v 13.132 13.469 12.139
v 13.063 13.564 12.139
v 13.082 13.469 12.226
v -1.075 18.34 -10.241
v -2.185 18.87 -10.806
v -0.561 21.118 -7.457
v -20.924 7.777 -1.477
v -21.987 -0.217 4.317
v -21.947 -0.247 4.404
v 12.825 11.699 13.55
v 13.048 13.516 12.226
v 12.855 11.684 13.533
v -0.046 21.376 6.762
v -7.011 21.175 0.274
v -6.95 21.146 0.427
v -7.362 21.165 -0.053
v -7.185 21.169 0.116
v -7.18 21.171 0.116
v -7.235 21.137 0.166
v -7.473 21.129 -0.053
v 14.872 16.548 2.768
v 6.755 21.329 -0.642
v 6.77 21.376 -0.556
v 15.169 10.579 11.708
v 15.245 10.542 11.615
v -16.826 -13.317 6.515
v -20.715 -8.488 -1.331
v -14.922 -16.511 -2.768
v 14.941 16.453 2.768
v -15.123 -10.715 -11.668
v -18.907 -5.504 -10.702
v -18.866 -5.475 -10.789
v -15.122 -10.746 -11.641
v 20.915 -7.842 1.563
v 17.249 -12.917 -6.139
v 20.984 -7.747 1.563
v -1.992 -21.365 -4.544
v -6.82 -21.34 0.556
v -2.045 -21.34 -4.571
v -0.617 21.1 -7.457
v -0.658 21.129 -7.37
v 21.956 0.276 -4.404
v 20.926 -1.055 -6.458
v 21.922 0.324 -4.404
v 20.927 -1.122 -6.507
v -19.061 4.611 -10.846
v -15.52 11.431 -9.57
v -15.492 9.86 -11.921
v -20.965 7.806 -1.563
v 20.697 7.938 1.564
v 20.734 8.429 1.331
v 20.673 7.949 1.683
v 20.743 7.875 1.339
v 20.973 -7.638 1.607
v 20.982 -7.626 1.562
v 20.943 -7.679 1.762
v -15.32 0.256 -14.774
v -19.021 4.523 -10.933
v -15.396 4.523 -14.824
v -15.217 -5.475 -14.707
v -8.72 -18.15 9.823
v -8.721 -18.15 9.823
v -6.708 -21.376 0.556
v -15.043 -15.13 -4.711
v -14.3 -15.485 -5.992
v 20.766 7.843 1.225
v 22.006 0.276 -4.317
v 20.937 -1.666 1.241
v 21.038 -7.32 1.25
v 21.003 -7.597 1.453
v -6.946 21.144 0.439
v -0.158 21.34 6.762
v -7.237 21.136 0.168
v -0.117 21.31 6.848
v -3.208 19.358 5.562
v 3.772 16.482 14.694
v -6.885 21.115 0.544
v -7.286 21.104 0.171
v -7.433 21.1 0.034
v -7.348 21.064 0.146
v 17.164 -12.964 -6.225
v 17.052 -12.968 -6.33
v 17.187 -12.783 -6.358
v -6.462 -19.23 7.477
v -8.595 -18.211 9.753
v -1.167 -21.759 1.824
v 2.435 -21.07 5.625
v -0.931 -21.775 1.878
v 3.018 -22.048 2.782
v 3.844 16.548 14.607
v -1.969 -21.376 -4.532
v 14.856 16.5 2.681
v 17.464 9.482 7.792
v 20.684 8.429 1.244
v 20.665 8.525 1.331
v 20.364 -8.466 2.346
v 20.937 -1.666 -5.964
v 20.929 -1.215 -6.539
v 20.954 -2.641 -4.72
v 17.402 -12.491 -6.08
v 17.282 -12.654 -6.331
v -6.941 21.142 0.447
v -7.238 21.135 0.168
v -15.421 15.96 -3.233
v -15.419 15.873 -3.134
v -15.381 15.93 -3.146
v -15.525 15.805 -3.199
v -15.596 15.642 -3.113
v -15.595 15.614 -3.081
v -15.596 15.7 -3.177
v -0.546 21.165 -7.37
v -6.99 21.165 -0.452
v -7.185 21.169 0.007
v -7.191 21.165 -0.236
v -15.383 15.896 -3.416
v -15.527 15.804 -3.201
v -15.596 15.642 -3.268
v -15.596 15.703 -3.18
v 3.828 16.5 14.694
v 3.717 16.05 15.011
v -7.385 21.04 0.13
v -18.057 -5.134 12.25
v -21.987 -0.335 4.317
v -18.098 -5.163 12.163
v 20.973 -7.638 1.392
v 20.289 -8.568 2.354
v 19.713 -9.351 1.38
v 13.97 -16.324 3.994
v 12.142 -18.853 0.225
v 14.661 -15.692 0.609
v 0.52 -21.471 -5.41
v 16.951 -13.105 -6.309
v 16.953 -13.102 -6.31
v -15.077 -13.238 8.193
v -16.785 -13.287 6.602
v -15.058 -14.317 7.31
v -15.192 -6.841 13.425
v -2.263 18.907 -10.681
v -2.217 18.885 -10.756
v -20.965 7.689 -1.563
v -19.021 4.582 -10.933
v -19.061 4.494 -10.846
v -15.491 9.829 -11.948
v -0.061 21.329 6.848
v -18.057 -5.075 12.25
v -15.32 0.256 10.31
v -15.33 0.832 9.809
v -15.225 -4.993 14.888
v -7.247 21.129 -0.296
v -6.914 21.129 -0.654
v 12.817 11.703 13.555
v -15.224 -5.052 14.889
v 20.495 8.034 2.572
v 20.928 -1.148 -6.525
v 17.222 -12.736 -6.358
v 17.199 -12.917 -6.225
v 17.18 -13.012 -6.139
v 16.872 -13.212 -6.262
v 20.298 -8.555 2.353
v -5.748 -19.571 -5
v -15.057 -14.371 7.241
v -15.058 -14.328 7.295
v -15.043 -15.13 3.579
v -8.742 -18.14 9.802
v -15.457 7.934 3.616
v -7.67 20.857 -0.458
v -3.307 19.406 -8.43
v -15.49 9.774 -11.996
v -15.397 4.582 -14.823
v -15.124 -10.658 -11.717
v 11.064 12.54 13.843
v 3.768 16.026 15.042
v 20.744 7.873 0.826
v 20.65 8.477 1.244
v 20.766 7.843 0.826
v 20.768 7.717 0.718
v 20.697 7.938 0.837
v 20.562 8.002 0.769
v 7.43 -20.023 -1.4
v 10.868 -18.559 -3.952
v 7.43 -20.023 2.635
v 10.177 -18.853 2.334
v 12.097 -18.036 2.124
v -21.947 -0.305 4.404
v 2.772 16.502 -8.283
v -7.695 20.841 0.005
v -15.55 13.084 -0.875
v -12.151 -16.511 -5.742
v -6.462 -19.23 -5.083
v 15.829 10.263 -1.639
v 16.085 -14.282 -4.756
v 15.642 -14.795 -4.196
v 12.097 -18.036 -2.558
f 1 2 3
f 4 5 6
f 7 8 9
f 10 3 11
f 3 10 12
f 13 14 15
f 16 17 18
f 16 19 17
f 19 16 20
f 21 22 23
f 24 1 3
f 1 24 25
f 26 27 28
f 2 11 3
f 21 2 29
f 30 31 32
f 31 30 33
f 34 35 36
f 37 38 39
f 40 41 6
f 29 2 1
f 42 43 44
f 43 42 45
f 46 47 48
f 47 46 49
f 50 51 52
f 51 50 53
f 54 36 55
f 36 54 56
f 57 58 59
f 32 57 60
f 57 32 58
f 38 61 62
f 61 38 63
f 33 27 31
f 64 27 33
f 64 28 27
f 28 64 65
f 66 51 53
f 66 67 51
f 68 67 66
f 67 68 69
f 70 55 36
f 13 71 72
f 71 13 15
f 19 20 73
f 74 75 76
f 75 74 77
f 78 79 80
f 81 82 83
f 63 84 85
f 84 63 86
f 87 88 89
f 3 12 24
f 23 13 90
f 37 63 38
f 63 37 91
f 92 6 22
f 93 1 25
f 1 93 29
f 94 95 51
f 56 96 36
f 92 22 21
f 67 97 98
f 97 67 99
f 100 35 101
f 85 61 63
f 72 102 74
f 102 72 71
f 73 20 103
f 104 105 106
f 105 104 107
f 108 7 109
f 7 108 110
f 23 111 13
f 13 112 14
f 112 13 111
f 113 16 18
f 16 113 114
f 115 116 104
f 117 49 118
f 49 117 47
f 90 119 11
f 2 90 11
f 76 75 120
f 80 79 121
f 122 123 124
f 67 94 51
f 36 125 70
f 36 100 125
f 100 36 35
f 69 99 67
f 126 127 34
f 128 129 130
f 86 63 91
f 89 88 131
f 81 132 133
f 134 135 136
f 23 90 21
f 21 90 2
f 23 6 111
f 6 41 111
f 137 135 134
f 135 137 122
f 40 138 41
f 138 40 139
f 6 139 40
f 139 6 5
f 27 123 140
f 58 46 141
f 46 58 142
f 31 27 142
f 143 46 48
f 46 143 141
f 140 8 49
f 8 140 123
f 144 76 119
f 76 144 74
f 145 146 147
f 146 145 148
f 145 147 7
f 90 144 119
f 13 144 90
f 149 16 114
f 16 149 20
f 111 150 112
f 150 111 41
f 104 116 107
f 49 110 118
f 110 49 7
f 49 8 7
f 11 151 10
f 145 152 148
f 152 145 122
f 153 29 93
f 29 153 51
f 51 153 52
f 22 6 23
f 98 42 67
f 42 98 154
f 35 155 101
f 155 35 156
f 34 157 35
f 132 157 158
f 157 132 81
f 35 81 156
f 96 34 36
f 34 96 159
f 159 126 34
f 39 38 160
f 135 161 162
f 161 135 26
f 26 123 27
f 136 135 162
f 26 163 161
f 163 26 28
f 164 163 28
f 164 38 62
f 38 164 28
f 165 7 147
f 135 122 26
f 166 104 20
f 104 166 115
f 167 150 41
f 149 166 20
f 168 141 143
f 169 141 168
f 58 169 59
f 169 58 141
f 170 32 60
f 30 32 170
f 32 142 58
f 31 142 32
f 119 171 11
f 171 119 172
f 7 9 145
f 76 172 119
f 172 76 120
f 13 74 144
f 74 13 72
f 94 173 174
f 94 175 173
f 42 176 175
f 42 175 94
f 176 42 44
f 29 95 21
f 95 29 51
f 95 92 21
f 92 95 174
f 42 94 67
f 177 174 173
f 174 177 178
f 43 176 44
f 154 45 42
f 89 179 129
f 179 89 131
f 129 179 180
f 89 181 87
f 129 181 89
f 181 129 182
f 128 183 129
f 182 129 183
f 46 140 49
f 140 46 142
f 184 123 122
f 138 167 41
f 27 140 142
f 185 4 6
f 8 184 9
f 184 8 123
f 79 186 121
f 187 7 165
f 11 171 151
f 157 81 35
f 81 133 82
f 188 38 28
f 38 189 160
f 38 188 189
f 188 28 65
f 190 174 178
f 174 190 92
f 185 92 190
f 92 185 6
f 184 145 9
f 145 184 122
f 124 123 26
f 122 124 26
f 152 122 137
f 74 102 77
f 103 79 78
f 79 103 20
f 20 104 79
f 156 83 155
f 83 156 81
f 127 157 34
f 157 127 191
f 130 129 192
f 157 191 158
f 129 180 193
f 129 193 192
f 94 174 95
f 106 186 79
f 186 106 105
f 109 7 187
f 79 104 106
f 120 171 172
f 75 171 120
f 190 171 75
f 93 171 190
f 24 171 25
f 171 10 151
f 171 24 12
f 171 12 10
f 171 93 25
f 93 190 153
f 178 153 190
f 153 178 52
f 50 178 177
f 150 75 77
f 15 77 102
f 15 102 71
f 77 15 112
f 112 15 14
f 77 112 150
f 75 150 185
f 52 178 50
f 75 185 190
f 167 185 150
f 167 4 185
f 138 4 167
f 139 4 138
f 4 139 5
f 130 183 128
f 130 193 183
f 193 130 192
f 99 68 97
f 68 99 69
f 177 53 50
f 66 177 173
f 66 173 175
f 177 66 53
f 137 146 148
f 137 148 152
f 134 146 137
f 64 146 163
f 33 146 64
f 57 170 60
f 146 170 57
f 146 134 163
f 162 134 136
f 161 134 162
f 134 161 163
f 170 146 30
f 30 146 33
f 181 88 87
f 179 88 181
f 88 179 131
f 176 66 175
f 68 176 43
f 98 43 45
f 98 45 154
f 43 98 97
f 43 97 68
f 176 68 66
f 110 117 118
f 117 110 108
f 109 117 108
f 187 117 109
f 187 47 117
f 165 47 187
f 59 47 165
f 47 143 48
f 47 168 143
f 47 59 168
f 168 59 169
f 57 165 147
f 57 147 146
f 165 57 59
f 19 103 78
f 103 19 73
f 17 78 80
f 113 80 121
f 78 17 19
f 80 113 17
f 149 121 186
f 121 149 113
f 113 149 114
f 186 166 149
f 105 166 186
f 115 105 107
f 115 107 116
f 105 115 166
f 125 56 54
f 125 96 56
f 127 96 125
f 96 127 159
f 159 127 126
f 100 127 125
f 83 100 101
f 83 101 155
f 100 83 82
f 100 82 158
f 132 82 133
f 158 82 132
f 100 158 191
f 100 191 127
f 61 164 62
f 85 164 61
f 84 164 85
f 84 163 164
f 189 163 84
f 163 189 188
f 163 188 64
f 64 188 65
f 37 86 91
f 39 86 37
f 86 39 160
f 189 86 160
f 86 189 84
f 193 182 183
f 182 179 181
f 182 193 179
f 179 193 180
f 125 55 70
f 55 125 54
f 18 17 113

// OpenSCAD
// Auto-generated OpenSCAD file

    inner_points = 10*[[0.7057265485457351, -0.09094884907028836, -2.1180339887490542], [0.7057265485407271, -0.09094884906961656, 2.1180339887507356], [0.16480805396553816, 0.7501261667404855, -2.118033988749827], [0.16480805396053017, 0.7501261667411573, 2.118033988749963], [-0.13534846726503874, -0.6318673436504852, -2.118033988749963], [-0.13534846727004674, -0.6318673436498135, 2.118033988749827], [-0.6762669618452357, 0.20920767216028854, -2.1180339887507356], [-0.6762669618502437, 0.20920767216096034, 2.1180339887490542], [2.0666145112140093, 0.7842756603041526, -0.49999999999768924], [2.066614511212827, 0.7842756603043113, 0.5000000000023108], [-1.496236429937139, -1.5070918530244133, -0.5000000000015379], [-1.496236429938321, -1.5070918530242545, 0.4999999999984621], [1.189538758212475, -0.8432292128820578, -1.670820393248405], [1.5809510579168244, -1.4518368117400606, 0.5000000000020912], [-0.7104164554105592, 2.1110141294109295, -0.5000000000011826], [-0.7104164554117414, 2.111014129411088, 0.4999999999988174], [0.3484637424017012, -1.3841477074622546, -1.6708203932493135], [0.7398760421060506, -1.9927553063202574, 0.5000000000011826], [-1.551491471221333, 1.5700956348307327, -0.5000000000020912], [-1.5514914712225152, 1.570095634830891, 0.4999999999979088], [1.2066135049926328, -1.794132441507042, -0.36180339887328655], [0.7228012953227978, -1.0418520776948579, 1.809016994375959], [-0.6933417086273064, 1.16011090078553, -1.809016994375959], [-0.6933417086315835, 1.1601109007861032, 1.8090169943739358], [1.5362487904951605, 1.0376601608124174, -1.3090169943733039], [1.5362487904920659, 1.0376601608128326, 1.309016994376591], [-1.5067892037965744, -0.9194013377221607, -1.309016994376591], [-1.506789203799669, -0.9194013377217455, 1.3090169943733039], [2.0942420318555155, -0.7543180836233406, 2.587389943224604e-12], [-0.10772094662544573, -2.170461087577722, 2.0876308632757284e-13], [1.5533235372772314, 0.08675693218717659, -1.6180339887480804], [1.5533235372734056, 0.08675693218768951, 1.6180339887517095], [0.678099027903047, 1.447644894857364, -1.618033988749331], [0.6780990278992212, 1.4476448948578768, 1.618033988750459], [-0.6486394412037297, -1.3293860717672048, -1.618033988750459], [-0.6486394412075556, -1.3293860717666919, 1.618033988749331], [-1.5238639505779141, 0.031501890902982464, -1.6180339887517095], [-1.52386395058174, 0.03150189090349539, 1.6180339887480804], [2.08368925799608, -0.1666275683210884, -0.8090169943724658], [2.083689257994167, -0.16662756832083173, 0.8090169943774291], [-0.6380866673442945, -1.9170765870694573, -0.8090169943754059], [-0.6380866673462073, -1.9170765870692006, 0.809016994374489], [1.719904478931324, -1.0966137133903227, -0.8618033988727903], [1.5703982840554762, -0.8641462964375515, 1.309016994376933], [-0.1800507346897975, 1.857629628902408, -1.309016994375463], [-0.18005073469289257, 1.8576296289028231, 1.3090169943744319], [0.3590165162611366, -1.9718382227645073, -0.8618033988742605], [0.2095103213852889, -1.7393708058117359, 1.309016994375463], [-1.5409386973599848, 0.9824051195282235, -1.309016994376933], [-1.5409386973630799, 0.9824051195286387, 1.309016994372962]];

    outer_points = 10*[[1.2164351229694326, -0.4552393565390054, 1.81634542347101], [-1.8825899471092338, -0.5445384218729208, -1.070234075166359], [1.2010095010844373, 0.5445384218729208, 1.80197726481464], [-1.898015568994229, 0.4552393565390054, -1.0846022338227295], [1.898015568994229, -0.4552393565390054, 1.0846022338227295], [-1.2010095010844373, -0.5445384218729208, -1.80197726481464], [1.8825899471092338, 0.5445384218729208, 1.070234075166359], [-1.2164351229694326, 0.4552393565390054, -1.81634542347101], [-1.0701074495480267, -0.4893485643329636, 1.8977555181073444], [-1.8016880300626414, -0.5104292140789626, 1.2163265339716638], [1.817113651947637, -0.4893485643329636, -1.2019583753152931], [1.0855330714330222, -0.5104292140789626, -1.8833873594509738], [0.9030594368115687, -1.3588953396765044, 1.5244523891846673], [-0.6739085218196809, -2.12810364074632, 0.05558935114624375], [-0.007671924205115532, 2.12810364074632, 0.6761538385020369], [-0.7392525047197304, 2.107022991000321, -0.005275145633643785], [1.5846398828363653, -1.3588953396765044, 0.7927091995363865], [0.007671924205115532, -2.12810364074632, -0.6761538385020369], [0.6739085218196809, 2.12810364074632, -0.05558935114624375], [-0.05767205869493397, 2.107022991000321, -0.7370183352819244], [0.2986778374294102, -2.1953274817801613, 0.27820275819814366], [-1.3032493017093665, -1.34686135618262, -1.2139084489020384], [1.3032493017093665, 1.34686135618262, 1.2139084489020384], [-1.343634104101889, 1.2705908488966635, -1.2515247766201674], [-0.275339197244193, 0.02759492876997861, 2.2157379862851325], [-2.1906420225408336, -0.02759492876997861, 0.4317337448986074], [2.1906420225408336, 0.02759492876997861, -0.4317337448986074], [0.275339197244193, -0.02759492876997861, -2.2157379862851325], [-0.8642951747413561, -1.808614991745605, 0.9838565139549793], [0.920105599018874, -1.808614991745605, -0.9318720275804797], [0.3040014481556744, -0.7747280055397205, 2.072063612549453], [-2.0634430414083775, -0.842946421127637, -0.1330869019522355], [0.2790422676481473, 0.842946421127637, 2.0488154434876944], [-2.0884022219159046, 0.7747280055397205, -0.15633507101399402], [2.0884022219159046, -0.7747280055397205, 0.15633507101399402], [-0.2790422676481473, -0.842946421127637, -2.0488154434876944], [2.0634430414083775, 0.842946421127637, 0.1330869019522355], [-0.3040014481556744, 0.7747280055397205, -2.072063612549453], [-0.49076680414815965, -1.2916714986426625, 1.754081144371665], [-1.6744890489301856, -1.325780706436621, 0.6515058871208207], [1.714873851322708, -1.2916714986426625, -0.6138895594026917], [0.5311516065406822, -1.325780706436621, -1.7164648166535361], [0.1082911845077349, -1.8758388327794464, 1.2064699210068792], [-1.4841023960085102, -1.645269355437336, -0.27676127568791475], [0.3812820682730764, 1.645269355437336, 1.460746627575093], [-1.5340207570235642, 1.590079497897379, -0.3232576138114317], [1.2111115122431686, -1.8758388327794464, 0.02248456911970087], [-0.3812820682730764, -1.645269355437336, -1.460746627575093], [1.4841023960085102, 1.645269355437336, 0.27676127568791475], [-0.4312004292881303, 1.590079497897379, -1.5072429656986102]];

    // Convex hull for inner set (I)
    module inner_hull() {
        hull() {
            for (p = inner_points) {
                translate(p) sphere(r=0.1);
            }
        }
    }

    // Convex hull for outer set (O) minus inner hull (O \ I)
    module outer_minus_inner() {
        difference() {
            hull() {
                for (p = outer_points) {
                    translate(p) sphere(r=0.1);
                }
            }
            inner_hull(); // Subtract inner hull
        }
    }

    // Convex hull for outer set (O) minus all translated inner hulls
    module outer_minus_AllTranslationInner() {
        difference() {
            hull() {
                for (p = outer_points) {
                    translate(p) sphere(r=0.1);
                }
            }
            hull() {
                translate([0,0,50]) inner_hull();
                translate([0,0,-50]) inner_hull();
            }; // Subtract translated inner hulls
        }
    }

    // Difference between outer_minus_inner and outer_minus_AllTranslationInner
    module outer_minus_inner_diff() {
        difference() {
            // Outer minus inner
            difference() {
                hull() {
                    for (p = outer_points) {
                        translate(p) sphere(r=0.1);
                    }
                }
                inner_hull();
            }

            // Subtract Outer minus AllTranslationInner
            difference() {
                hull() {
                    for (p = outer_points) {
                        translate(p) sphere(r=0.1);
                    }
                }
                hull() {
                    translate([0,0,50]) inner_hull();
                    translate([0,0,-50]) inner_hull();
                };
            }
        }
    }

    // Rendering all with colors applied
    color([0, 1, 0, 1]) outer_minus_AllTranslationInner(); // Opaque green
    
